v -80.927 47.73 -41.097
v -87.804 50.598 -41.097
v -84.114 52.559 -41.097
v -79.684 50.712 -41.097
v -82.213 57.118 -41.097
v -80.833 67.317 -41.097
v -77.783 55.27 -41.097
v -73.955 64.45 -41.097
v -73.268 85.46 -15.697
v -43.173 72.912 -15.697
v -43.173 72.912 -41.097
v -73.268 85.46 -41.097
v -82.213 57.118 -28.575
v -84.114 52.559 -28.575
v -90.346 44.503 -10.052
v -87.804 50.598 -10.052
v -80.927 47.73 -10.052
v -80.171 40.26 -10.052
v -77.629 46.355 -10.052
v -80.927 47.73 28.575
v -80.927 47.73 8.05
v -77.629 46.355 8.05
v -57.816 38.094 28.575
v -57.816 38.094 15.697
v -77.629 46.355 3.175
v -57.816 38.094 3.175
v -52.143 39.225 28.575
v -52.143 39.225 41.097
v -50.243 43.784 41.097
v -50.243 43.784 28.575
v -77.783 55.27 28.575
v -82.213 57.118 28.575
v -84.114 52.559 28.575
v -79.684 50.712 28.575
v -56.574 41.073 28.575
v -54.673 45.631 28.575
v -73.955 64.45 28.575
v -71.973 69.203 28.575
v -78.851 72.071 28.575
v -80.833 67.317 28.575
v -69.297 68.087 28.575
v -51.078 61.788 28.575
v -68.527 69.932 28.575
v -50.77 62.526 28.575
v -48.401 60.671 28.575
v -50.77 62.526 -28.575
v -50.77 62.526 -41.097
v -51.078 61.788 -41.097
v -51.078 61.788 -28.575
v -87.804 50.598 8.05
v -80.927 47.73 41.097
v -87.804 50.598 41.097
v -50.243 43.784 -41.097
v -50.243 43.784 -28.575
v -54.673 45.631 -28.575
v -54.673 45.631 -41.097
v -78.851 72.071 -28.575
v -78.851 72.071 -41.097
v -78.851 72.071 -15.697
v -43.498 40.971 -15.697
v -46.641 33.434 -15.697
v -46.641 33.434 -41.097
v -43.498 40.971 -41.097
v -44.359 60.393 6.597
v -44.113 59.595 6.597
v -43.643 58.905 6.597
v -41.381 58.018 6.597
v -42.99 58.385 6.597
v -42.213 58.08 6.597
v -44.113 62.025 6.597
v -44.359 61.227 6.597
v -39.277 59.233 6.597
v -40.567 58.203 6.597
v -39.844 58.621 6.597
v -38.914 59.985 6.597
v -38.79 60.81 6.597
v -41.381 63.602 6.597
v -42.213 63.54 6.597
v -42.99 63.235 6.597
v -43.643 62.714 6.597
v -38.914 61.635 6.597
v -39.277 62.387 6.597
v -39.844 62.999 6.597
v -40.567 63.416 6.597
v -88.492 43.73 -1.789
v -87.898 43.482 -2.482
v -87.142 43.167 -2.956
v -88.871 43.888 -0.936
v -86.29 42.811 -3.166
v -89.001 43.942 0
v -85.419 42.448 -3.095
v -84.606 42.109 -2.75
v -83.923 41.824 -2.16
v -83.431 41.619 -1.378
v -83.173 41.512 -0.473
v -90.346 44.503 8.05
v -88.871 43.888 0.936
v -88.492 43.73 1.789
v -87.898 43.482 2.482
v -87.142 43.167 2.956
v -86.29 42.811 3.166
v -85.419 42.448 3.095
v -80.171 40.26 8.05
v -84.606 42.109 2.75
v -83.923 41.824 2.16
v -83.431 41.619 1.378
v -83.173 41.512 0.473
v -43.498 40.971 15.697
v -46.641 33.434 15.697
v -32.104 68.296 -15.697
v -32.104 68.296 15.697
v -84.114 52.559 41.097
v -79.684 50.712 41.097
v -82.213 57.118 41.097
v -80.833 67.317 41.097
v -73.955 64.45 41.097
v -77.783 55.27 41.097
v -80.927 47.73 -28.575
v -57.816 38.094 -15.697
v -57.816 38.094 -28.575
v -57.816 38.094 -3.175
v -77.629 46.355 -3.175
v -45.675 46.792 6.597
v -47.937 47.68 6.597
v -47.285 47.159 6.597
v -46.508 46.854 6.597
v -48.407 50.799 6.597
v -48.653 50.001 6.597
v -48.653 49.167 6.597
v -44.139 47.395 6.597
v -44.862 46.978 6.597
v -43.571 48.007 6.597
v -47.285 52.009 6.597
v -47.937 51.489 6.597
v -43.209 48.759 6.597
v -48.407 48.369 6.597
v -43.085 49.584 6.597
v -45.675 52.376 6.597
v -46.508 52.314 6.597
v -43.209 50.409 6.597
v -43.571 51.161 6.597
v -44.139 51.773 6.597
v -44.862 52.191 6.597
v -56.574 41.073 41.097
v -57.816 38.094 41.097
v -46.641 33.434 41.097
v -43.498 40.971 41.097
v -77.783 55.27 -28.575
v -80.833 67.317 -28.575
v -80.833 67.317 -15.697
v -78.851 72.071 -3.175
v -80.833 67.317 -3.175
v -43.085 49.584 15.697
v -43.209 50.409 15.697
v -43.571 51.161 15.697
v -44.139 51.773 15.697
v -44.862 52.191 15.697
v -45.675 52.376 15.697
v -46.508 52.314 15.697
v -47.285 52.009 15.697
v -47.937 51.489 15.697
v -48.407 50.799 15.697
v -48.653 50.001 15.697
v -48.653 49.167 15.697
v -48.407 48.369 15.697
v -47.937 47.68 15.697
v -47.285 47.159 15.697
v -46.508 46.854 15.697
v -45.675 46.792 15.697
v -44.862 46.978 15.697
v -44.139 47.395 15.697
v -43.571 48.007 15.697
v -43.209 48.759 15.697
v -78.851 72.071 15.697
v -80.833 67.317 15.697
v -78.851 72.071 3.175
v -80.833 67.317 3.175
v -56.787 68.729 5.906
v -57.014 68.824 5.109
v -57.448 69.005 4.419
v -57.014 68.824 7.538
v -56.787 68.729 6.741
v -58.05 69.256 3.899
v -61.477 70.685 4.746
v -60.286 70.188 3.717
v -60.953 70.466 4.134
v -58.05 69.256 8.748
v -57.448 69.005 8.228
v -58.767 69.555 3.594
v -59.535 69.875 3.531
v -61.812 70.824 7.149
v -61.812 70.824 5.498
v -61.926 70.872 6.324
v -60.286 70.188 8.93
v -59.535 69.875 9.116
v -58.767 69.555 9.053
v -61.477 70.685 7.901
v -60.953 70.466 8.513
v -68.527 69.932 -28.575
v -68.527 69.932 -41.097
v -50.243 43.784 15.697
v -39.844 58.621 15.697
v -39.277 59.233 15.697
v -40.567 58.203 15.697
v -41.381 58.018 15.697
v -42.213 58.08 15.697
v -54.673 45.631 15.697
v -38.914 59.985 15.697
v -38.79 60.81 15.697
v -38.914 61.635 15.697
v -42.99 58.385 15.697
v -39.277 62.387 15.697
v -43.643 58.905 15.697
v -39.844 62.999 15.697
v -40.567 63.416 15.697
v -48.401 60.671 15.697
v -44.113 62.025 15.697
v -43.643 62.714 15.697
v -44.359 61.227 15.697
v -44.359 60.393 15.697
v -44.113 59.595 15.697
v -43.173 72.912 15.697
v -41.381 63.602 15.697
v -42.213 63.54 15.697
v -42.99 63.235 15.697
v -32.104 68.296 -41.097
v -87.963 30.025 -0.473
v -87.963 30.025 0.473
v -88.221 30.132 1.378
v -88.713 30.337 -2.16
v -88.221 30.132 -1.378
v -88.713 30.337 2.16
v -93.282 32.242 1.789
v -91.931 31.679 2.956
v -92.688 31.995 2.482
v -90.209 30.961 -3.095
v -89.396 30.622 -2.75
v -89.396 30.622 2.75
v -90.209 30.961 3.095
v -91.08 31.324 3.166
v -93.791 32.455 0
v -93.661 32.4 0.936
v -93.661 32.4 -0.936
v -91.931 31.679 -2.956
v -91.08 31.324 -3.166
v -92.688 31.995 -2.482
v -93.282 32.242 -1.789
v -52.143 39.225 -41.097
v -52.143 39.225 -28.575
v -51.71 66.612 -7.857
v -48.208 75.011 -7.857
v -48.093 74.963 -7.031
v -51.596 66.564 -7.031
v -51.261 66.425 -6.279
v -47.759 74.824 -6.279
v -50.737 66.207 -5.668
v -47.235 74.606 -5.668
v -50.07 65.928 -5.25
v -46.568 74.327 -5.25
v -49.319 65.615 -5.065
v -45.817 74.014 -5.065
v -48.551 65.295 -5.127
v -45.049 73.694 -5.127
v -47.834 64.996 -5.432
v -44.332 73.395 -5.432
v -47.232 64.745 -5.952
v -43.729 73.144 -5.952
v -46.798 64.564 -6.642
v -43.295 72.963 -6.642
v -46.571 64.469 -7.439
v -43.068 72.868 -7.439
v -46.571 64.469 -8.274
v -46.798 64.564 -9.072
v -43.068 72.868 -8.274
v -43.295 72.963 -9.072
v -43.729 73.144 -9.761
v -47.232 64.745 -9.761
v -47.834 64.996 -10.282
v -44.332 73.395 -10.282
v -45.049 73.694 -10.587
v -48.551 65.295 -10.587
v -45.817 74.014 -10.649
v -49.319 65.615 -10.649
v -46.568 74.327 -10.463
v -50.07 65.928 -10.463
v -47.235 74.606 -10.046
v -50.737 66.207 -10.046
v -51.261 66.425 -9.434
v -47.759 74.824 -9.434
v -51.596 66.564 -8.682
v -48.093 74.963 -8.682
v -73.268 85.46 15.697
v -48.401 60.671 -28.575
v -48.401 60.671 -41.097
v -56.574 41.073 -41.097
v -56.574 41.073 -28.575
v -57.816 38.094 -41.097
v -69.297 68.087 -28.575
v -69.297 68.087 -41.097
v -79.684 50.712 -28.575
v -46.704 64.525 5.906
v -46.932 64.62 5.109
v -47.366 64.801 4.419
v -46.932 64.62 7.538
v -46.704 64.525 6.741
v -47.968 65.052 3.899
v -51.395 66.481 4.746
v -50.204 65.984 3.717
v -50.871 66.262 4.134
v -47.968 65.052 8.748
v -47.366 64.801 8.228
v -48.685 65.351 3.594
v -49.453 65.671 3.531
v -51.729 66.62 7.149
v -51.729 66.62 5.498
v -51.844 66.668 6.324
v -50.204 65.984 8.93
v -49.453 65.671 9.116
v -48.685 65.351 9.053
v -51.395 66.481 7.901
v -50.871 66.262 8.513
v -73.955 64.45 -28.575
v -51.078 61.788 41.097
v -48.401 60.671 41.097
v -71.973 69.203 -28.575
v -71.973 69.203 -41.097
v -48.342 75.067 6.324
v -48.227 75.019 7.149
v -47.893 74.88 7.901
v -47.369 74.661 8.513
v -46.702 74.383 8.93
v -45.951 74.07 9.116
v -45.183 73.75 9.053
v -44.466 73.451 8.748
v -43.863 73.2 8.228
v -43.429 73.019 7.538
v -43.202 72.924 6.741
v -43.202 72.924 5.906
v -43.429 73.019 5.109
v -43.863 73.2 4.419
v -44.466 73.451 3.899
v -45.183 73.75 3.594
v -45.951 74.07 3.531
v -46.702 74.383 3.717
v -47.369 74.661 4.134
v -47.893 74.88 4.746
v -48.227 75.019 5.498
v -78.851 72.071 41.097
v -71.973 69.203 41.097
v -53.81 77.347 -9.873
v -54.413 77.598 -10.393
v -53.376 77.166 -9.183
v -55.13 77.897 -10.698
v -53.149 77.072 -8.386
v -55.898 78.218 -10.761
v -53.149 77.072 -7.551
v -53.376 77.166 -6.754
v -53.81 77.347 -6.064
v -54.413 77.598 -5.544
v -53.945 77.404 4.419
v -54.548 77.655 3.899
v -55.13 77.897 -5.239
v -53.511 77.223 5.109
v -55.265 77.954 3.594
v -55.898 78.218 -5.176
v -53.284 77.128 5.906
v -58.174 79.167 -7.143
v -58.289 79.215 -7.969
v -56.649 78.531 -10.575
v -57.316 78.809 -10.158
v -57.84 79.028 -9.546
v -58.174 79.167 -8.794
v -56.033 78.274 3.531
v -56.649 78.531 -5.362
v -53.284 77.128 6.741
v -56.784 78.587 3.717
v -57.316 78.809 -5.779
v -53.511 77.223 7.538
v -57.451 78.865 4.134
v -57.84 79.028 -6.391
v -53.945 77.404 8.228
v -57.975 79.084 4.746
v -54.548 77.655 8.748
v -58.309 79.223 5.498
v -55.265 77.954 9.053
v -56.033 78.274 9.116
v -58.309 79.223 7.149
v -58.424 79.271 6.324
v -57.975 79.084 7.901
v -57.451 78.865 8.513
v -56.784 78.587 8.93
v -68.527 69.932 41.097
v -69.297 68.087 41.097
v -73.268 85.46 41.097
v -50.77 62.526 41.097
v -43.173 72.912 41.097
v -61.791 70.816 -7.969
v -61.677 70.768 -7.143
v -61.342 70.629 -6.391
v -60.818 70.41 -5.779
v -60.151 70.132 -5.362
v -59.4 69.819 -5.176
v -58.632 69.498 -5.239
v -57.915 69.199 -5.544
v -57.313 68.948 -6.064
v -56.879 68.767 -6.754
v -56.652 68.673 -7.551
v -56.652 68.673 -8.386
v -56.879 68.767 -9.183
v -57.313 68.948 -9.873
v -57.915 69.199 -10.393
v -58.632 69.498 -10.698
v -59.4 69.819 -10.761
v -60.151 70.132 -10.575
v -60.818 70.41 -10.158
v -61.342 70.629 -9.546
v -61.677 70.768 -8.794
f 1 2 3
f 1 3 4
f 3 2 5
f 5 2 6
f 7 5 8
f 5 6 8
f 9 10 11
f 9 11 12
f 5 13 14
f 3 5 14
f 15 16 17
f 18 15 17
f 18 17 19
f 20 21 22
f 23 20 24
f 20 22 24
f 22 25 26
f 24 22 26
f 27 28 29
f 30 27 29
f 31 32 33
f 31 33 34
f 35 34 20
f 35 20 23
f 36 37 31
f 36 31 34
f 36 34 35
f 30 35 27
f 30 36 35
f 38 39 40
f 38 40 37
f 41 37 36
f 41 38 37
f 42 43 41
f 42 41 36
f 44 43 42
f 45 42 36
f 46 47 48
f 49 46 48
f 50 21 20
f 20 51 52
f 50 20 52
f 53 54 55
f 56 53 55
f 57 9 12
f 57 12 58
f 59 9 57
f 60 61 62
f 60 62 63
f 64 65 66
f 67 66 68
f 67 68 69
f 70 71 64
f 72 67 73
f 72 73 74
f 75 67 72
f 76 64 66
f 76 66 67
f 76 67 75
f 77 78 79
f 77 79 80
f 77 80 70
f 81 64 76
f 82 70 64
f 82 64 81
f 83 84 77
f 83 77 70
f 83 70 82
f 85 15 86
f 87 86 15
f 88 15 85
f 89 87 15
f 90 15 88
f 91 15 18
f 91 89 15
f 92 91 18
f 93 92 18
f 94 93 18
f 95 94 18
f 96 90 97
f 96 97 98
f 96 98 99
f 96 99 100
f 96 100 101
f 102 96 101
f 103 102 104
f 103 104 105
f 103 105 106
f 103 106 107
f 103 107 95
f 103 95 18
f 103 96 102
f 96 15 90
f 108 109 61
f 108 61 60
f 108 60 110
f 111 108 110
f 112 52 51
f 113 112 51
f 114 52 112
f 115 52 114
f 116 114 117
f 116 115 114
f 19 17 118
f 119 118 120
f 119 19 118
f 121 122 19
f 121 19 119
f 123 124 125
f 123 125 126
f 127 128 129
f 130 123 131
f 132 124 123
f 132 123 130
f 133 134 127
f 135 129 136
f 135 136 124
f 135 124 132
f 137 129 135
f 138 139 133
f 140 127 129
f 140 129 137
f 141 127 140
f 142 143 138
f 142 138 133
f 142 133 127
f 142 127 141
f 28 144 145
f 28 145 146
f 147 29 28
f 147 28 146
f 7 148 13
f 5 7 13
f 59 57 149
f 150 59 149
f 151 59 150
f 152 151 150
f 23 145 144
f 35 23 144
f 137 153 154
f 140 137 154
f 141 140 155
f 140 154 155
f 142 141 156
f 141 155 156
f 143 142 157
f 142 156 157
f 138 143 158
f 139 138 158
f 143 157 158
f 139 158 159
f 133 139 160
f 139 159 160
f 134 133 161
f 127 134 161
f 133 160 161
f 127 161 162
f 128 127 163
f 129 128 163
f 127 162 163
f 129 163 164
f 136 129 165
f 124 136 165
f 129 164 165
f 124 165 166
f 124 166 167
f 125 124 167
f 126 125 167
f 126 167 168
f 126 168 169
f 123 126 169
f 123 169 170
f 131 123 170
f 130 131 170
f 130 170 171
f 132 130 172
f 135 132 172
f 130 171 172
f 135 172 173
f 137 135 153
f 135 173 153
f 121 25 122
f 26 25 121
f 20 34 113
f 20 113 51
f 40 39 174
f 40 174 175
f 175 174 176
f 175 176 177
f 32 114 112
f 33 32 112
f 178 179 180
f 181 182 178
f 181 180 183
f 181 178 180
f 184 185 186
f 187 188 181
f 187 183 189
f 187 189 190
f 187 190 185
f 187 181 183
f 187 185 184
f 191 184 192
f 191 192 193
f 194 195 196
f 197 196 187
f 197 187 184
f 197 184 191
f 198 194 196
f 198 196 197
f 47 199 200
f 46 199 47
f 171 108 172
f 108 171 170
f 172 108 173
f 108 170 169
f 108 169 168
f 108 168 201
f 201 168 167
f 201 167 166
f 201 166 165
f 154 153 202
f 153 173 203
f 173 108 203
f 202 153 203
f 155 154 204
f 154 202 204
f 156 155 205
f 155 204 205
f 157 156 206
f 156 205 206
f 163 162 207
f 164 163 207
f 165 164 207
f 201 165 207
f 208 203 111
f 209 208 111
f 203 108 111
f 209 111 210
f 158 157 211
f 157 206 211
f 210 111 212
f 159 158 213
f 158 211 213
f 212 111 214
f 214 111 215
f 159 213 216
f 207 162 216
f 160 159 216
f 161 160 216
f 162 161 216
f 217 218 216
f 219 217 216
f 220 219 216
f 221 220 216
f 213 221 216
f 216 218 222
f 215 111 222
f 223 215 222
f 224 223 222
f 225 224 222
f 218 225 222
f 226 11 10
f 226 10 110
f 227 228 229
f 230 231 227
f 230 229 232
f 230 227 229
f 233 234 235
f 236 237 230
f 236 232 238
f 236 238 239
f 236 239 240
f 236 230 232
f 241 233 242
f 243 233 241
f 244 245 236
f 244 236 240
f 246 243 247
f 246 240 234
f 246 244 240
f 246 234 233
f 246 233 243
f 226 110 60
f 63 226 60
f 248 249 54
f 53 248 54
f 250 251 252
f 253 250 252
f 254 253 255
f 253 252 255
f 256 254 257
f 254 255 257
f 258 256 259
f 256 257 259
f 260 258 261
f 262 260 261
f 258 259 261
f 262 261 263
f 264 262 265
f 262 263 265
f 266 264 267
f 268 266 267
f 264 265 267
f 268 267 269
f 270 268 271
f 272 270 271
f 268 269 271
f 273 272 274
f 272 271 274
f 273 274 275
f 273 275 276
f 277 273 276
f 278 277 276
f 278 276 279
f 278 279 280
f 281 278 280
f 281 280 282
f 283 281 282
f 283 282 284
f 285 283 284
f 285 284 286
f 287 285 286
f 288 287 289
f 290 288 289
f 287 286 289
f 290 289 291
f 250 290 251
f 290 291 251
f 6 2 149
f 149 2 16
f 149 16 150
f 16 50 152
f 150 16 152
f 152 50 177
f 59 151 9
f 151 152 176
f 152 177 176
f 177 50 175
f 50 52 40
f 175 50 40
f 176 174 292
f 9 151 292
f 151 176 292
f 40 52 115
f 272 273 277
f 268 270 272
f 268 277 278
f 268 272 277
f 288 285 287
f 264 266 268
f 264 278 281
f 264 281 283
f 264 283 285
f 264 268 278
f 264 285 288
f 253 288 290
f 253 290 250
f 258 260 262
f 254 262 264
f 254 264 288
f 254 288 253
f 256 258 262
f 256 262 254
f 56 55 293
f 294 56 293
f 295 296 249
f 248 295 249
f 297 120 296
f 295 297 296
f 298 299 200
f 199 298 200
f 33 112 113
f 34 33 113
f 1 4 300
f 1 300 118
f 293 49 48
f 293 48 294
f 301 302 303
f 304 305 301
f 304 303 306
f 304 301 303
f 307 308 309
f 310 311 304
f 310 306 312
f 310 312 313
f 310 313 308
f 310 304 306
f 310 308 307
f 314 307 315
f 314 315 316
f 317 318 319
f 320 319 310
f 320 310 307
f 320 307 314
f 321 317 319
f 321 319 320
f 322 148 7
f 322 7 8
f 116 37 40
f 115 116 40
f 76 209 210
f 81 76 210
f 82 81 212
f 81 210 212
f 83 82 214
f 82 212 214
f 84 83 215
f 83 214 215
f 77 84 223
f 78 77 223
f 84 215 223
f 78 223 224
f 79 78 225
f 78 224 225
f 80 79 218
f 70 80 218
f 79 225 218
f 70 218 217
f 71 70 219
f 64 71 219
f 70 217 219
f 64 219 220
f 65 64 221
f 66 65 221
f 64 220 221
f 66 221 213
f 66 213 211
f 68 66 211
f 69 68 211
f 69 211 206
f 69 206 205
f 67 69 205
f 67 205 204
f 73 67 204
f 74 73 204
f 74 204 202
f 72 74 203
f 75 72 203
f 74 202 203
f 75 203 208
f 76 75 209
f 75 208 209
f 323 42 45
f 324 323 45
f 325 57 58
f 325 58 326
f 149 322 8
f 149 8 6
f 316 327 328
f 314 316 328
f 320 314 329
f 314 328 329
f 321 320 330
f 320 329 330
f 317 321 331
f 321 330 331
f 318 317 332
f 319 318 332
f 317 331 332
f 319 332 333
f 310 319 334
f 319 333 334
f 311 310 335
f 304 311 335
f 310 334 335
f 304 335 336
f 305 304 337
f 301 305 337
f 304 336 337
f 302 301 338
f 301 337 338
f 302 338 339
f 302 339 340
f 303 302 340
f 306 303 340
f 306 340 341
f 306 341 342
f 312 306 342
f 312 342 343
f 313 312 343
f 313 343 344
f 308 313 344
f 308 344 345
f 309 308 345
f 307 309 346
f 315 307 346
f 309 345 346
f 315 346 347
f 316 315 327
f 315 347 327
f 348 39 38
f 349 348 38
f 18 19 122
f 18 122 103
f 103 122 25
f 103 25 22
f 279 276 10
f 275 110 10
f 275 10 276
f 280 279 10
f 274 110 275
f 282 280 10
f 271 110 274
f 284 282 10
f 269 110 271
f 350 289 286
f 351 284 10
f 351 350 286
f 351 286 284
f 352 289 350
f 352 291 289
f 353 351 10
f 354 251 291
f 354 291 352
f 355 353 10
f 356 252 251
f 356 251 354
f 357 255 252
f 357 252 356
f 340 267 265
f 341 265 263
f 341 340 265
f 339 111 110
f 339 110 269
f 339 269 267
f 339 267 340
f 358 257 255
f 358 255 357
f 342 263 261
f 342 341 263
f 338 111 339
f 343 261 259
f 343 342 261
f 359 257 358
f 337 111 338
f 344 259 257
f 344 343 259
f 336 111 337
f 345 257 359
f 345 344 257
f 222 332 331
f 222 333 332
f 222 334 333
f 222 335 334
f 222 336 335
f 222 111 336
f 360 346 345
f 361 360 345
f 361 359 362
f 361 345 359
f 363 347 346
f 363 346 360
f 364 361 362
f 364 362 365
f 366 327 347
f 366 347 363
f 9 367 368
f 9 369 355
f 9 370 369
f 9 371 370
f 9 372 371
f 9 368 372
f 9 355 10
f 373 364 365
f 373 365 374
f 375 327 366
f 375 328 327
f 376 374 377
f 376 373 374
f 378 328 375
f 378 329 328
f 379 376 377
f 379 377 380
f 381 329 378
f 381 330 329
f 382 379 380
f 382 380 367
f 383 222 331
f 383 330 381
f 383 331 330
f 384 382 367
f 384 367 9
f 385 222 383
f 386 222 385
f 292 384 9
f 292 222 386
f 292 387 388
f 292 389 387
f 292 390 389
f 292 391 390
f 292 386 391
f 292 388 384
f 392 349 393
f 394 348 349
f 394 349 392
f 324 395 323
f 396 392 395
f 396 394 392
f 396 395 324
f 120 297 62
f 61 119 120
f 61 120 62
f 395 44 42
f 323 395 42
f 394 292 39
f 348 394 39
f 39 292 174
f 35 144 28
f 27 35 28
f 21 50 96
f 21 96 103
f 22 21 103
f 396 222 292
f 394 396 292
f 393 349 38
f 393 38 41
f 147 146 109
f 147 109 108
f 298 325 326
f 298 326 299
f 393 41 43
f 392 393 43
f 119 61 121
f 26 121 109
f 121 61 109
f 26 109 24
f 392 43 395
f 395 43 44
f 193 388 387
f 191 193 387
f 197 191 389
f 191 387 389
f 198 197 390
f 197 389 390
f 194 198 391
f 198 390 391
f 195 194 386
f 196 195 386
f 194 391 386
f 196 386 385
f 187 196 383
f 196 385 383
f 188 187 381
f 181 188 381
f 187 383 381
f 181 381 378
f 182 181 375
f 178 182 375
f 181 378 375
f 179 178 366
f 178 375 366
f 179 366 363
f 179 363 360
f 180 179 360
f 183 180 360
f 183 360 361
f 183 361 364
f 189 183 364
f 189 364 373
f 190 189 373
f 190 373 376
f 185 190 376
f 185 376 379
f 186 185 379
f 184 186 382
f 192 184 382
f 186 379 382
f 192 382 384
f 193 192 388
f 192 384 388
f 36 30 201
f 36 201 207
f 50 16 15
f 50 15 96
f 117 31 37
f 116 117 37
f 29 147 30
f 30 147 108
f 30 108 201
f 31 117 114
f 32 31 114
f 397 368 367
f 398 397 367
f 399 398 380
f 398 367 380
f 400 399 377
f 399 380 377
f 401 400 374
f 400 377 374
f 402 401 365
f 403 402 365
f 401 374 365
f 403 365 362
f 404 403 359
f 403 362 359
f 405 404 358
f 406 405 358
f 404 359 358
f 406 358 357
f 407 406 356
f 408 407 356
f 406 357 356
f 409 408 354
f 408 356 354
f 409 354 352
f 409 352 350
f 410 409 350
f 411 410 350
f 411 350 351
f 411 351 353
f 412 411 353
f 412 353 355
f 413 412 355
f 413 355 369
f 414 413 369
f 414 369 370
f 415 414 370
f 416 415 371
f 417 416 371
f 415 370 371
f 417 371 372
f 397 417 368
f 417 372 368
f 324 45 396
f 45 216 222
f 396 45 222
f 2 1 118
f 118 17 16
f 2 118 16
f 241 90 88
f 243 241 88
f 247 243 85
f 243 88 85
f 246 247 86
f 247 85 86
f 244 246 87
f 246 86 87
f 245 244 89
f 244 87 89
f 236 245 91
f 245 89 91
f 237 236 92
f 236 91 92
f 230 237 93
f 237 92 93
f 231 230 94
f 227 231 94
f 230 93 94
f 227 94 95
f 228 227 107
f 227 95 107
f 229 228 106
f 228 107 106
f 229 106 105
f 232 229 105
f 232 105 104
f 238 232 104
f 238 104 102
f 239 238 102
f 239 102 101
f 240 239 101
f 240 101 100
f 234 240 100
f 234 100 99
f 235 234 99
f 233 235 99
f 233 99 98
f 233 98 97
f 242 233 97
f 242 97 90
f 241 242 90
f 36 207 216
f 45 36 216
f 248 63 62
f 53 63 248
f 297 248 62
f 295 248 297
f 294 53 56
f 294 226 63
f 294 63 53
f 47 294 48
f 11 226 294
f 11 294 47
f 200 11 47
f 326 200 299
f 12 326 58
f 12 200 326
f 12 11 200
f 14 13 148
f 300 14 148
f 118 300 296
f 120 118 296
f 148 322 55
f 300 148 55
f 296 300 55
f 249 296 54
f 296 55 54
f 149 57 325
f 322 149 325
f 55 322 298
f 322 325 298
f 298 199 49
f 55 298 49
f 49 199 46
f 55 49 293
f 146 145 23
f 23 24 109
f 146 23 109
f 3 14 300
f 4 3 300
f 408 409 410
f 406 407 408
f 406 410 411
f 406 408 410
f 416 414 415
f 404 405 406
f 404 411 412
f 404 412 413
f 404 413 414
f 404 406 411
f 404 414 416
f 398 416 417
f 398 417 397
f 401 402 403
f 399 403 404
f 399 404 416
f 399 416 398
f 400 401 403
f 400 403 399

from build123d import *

# Parameters (mm, degrees)
BOSS_EXTRUDE1_DEPTH  = 15.696834748
SKETCH6_W            = 13.410834748
SKETCH6_H            = 5.149998248
CUT_EXTRUDE1_DEPTH   = 22.86
BOSS_EXTRUDE7_DEPTH  = 3.175
SKETCH12_R           = 2.8
CUT_EXTRUDE3_DEPTH   = 9.1
SKETCH13_R           = 2.8
CUT_EXTRUDE4_DEPTH   = 9.1
CUT_EXTRUDE6_DEPTH   = 98.762
SKETCH15_R           = 3.175
BOSS_EXTRUDE8_DEPTH  = 19.05
BOSS_EXTRUDE9_DEPTH  = 25.4
BOSS_EXTRUDE10_DEPTH = 25.4
BOSS_EXTRUDE11_DEPTH = 25.4
SKETCH21_W           = 11.024255738
SKETCH21_H           = 18.102082359
BOSS_EXTRUDE12_DEPTH = 6.604


with BuildPart() as part:
    # Sketch1 → Boss-Extrude1 (new body)
    with BuildSketch(Plane.XY):
        Polygon((-68.527338122, 69.932197609), (-69.296818428, 68.086800577), (-71.973324576, 69.203128997), (-77.782900884, 55.270381406), (-82.212980026, 57.11809741), (-84.113890894, 52.559260429), (-79.683811753, 50.711544425), (-80.926887502, 47.730352729), (-87.80424407, 50.598023124), (-73.267575276, 85.460416929), (-27.617891017, 66.425741791), (-42.154559811, 31.563347985), (-57.815709039, 38.093620707), (-56.573548036, 41.072618624), (-52.143468895, 39.22490262), (-50.242558026, 43.783739601), (-54.672637167, 45.631455606), (-48.401372675, 60.671441415), (-51.077878823, 61.787769834), (-50.770086701, 62.525928647), align=None)
    boss_extrude1 = extrude(amount=BOSS_EXTRUDE1_DEPTH)

    # Mirror4: Boss-Extrude1 across plane
    add(boss_extrude1.mirror(Plane(origin=(0, 0, 0), x_dir=(1, 0, 0), z_dir=(0, 0, -1))))

    # Sketch6 → Cut-Extrude1 (cut)
    with BuildSketch(Plane(origin=(-85.89491474, 35.815840233, 0), x_dir=(0, 0, -1), z_dir=(0.9229765876476943, -0.38485610123034036, 0))):
        with Locations((-8.991417374, 33.598495643)):
            Rectangle(SKETCH6_W, SKETCH6_H)
    cut_extrude1 = extrude(amount=-CUT_EXTRUDE1_DEPTH, mode=Mode.SUBTRACT)

    # Mirror5: Cut-Extrude1 across plane
    add(cut_extrude1.mirror(Plane.XY), mode=Mode.SUBTRACT)

    # Sketch8 → Boss-Extrude7 (add, symmetric)
    with BuildSketch(Plane.XY):
        Polygon((-73.267575276, 85.460416929), (-87.80424407, 50.598023124), (-42.154559811, 31.563347985), (-27.617891017, 66.425741791), align=None)
    extrude(amount=BOSS_EXTRUDE7_DEPTH, both=True)

    # Sketch12 → Cut-Extrude3 (cut)
    with BuildSketch(Plane(origin=(19.504696032, 46.776906301, 0), x_dir=(0.9229765876476947, -0.38485610123033953, 0), z_dir=(0.38485610123033953, 0.9229765876476949, 0))):
        with Locations(Location((-81.485896456, 7.968513911, 0), (0, 0, 180))):
            Circle(SKETCH12_R)
        with Locations(Location((-70.563570403, 7.856727715, 0), (0, 0, 180))):
            Circle(SKETCH12_R)
        with Locations(Location((-70.708700217, -6.323512761, 0), (0, 0, 180))):
            Circle(SKETCH12_R)
        with Locations(Location((-81.632170363, -6.323512761, 0), (0, 0, 180))):
            Circle(SKETCH12_R)
    extrude(amount=-CUT_EXTRUDE3_DEPTH, mode=Mode.SUBTRACT)

    # Sketch13 → Cut-Extrude4 (cut)
    with BuildSketch(Plane.XY.offset(15.696834748)):
        with Locations((-45.884678207, 49.584175244)):
            Circle(SKETCH13_R)
        with Locations((-41.590000601, 60.809890325)):
            Circle(SKETCH13_R)
    extrude(amount=-CUT_EXTRUDE4_DEPTH, mode=Mode.SUBTRACT)

    # Sketch14 → Cut-Extrude6 (cut)
    with BuildSketch(Plane.XY.offset(15.696834748)):
        Polygon((-46.640769275, 33.433975157), (-32.104100481, 68.296368962), (-25.409987335, 65.505106084), (-39.946656129, 30.642712279), align=None)
    extrude(amount=-CUT_EXTRUDE6_DEPTH, mode=Mode.SUBTRACT)

    # Sketch15 → Boss-Extrude8 (add)
    with BuildSketch(Plane(origin=(4.968027238, 11.914512496, 0), x_dir=(0.9229765876476949, -0.3848561012303393, 0), z_dir=(-0.3848561012303393, -0.9229765876476949, 0))):
        with Locations(Location((-95.882584307, 0, 0), (0, 0, 180))):
            Circle(SKETCH15_R)
    extrude(amount=BOSS_EXTRUDE8_DEPTH)

    # Sketch17 → Boss-Extrude9 (add)
    with BuildSketch(Plane.XY.offset(15.696834748)):
        Polygon((-51.077878823, 61.787769834), (-48.401372675, 60.671441415), (-43.173444366, 72.911983906), (-73.267575276, 85.460416929), (-78.850681144, 72.070799392), (-71.973324576, 69.203128997), (-69.296818428, 68.086800577), (-68.527338122, 69.932197609), (-50.770086701, 62.525928647), align=None)
        Polygon((-84.113890894, 52.559260429), (-82.212980026, 57.11809741), (-77.782900884, 55.270381406), (-73.955332823, 64.449801187), (-80.832689391, 67.317471582), (-87.80424407, 50.598023124), (-80.926887502, 47.730352729), (-79.683811753, 50.711544425), align=None)
        Polygon((-43.497872754, 40.971389524), (-50.242558026, 43.783739601), (-52.143468895, 39.22490262), (-56.573548036, 41.072618624), (-57.815709039, 38.093620707), (-46.640769275, 33.433975157), align=None)
    boss_extrude9 = extrude(amount=BOSS_EXTRUDE9_DEPTH)

    # Sketch18 → Boss-Extrude10 (add)
    with BuildSketch(Plane.XY.offset(3.175)):
        Polygon((-79.683811753, 50.711544425), (-80.926887502, 47.730352729), (-57.815709039, 38.093620707), (-56.573548036, 41.072618624), (-52.143468895, 39.22490262), (-50.242558026, 43.783739601), (-54.672637167, 45.631455606), (-48.401372675, 60.671441415), (-51.077878823, 61.787769834), (-50.770086701, 62.525928647), (-68.527338122, 69.932197609), (-69.296818428, 68.086800577), (-71.973324576, 69.203128997), (-78.850681144, 72.070799392), (-80.832689391, 67.317471582), (-73.955332823, 64.449801187), (-77.782900884, 55.270381406), (-82.212980026, 57.11809741), (-84.113890894, 52.559260429), align=None)
    boss_extrude10 = extrude(amount=BOSS_EXTRUDE10_DEPTH)

    # Mirror6: Boss-Extrude9, Boss-Extrude10 across plane
    add(boss_extrude9.mirror(Plane.XY))
    add(boss_extrude10.mirror(Plane.XY))

    # Sketch19 → Boss-Extrude11 (add)
    with BuildSketch(Plane(origin=(0, 0, -15.696834748), x_dir=(-1, 0, 0), z_dir=(0, 0, -1))):
        Polygon((43.497872754, 40.971389524), (50.242558026, 43.783739601), (54.672637167, 45.631455606), (48.401372675, 60.671441415), (43.173444366, 72.911983906), (32.104100481, 68.296368962), align=None)
    extrude(amount=BOSS_EXTRUDE11_DEPTH)

    # Sketch21 → Boss-Extrude12 (add)
    with BuildSketch(Plane(origin=(4.968027238, 11.914512496, 0), x_dir=(0.9229765876476949, -0.3848561012303393, 0), z_dir=(-0.3848561012303393, -0.9229765876476949, 0))):
        with Locations((-95.002091614, -1.001456214)):
            Rectangle(SKETCH21_W, SKETCH21_H)
    extrude(amount=BOSS_EXTRUDE12_DEPTH)


solid = part.part
